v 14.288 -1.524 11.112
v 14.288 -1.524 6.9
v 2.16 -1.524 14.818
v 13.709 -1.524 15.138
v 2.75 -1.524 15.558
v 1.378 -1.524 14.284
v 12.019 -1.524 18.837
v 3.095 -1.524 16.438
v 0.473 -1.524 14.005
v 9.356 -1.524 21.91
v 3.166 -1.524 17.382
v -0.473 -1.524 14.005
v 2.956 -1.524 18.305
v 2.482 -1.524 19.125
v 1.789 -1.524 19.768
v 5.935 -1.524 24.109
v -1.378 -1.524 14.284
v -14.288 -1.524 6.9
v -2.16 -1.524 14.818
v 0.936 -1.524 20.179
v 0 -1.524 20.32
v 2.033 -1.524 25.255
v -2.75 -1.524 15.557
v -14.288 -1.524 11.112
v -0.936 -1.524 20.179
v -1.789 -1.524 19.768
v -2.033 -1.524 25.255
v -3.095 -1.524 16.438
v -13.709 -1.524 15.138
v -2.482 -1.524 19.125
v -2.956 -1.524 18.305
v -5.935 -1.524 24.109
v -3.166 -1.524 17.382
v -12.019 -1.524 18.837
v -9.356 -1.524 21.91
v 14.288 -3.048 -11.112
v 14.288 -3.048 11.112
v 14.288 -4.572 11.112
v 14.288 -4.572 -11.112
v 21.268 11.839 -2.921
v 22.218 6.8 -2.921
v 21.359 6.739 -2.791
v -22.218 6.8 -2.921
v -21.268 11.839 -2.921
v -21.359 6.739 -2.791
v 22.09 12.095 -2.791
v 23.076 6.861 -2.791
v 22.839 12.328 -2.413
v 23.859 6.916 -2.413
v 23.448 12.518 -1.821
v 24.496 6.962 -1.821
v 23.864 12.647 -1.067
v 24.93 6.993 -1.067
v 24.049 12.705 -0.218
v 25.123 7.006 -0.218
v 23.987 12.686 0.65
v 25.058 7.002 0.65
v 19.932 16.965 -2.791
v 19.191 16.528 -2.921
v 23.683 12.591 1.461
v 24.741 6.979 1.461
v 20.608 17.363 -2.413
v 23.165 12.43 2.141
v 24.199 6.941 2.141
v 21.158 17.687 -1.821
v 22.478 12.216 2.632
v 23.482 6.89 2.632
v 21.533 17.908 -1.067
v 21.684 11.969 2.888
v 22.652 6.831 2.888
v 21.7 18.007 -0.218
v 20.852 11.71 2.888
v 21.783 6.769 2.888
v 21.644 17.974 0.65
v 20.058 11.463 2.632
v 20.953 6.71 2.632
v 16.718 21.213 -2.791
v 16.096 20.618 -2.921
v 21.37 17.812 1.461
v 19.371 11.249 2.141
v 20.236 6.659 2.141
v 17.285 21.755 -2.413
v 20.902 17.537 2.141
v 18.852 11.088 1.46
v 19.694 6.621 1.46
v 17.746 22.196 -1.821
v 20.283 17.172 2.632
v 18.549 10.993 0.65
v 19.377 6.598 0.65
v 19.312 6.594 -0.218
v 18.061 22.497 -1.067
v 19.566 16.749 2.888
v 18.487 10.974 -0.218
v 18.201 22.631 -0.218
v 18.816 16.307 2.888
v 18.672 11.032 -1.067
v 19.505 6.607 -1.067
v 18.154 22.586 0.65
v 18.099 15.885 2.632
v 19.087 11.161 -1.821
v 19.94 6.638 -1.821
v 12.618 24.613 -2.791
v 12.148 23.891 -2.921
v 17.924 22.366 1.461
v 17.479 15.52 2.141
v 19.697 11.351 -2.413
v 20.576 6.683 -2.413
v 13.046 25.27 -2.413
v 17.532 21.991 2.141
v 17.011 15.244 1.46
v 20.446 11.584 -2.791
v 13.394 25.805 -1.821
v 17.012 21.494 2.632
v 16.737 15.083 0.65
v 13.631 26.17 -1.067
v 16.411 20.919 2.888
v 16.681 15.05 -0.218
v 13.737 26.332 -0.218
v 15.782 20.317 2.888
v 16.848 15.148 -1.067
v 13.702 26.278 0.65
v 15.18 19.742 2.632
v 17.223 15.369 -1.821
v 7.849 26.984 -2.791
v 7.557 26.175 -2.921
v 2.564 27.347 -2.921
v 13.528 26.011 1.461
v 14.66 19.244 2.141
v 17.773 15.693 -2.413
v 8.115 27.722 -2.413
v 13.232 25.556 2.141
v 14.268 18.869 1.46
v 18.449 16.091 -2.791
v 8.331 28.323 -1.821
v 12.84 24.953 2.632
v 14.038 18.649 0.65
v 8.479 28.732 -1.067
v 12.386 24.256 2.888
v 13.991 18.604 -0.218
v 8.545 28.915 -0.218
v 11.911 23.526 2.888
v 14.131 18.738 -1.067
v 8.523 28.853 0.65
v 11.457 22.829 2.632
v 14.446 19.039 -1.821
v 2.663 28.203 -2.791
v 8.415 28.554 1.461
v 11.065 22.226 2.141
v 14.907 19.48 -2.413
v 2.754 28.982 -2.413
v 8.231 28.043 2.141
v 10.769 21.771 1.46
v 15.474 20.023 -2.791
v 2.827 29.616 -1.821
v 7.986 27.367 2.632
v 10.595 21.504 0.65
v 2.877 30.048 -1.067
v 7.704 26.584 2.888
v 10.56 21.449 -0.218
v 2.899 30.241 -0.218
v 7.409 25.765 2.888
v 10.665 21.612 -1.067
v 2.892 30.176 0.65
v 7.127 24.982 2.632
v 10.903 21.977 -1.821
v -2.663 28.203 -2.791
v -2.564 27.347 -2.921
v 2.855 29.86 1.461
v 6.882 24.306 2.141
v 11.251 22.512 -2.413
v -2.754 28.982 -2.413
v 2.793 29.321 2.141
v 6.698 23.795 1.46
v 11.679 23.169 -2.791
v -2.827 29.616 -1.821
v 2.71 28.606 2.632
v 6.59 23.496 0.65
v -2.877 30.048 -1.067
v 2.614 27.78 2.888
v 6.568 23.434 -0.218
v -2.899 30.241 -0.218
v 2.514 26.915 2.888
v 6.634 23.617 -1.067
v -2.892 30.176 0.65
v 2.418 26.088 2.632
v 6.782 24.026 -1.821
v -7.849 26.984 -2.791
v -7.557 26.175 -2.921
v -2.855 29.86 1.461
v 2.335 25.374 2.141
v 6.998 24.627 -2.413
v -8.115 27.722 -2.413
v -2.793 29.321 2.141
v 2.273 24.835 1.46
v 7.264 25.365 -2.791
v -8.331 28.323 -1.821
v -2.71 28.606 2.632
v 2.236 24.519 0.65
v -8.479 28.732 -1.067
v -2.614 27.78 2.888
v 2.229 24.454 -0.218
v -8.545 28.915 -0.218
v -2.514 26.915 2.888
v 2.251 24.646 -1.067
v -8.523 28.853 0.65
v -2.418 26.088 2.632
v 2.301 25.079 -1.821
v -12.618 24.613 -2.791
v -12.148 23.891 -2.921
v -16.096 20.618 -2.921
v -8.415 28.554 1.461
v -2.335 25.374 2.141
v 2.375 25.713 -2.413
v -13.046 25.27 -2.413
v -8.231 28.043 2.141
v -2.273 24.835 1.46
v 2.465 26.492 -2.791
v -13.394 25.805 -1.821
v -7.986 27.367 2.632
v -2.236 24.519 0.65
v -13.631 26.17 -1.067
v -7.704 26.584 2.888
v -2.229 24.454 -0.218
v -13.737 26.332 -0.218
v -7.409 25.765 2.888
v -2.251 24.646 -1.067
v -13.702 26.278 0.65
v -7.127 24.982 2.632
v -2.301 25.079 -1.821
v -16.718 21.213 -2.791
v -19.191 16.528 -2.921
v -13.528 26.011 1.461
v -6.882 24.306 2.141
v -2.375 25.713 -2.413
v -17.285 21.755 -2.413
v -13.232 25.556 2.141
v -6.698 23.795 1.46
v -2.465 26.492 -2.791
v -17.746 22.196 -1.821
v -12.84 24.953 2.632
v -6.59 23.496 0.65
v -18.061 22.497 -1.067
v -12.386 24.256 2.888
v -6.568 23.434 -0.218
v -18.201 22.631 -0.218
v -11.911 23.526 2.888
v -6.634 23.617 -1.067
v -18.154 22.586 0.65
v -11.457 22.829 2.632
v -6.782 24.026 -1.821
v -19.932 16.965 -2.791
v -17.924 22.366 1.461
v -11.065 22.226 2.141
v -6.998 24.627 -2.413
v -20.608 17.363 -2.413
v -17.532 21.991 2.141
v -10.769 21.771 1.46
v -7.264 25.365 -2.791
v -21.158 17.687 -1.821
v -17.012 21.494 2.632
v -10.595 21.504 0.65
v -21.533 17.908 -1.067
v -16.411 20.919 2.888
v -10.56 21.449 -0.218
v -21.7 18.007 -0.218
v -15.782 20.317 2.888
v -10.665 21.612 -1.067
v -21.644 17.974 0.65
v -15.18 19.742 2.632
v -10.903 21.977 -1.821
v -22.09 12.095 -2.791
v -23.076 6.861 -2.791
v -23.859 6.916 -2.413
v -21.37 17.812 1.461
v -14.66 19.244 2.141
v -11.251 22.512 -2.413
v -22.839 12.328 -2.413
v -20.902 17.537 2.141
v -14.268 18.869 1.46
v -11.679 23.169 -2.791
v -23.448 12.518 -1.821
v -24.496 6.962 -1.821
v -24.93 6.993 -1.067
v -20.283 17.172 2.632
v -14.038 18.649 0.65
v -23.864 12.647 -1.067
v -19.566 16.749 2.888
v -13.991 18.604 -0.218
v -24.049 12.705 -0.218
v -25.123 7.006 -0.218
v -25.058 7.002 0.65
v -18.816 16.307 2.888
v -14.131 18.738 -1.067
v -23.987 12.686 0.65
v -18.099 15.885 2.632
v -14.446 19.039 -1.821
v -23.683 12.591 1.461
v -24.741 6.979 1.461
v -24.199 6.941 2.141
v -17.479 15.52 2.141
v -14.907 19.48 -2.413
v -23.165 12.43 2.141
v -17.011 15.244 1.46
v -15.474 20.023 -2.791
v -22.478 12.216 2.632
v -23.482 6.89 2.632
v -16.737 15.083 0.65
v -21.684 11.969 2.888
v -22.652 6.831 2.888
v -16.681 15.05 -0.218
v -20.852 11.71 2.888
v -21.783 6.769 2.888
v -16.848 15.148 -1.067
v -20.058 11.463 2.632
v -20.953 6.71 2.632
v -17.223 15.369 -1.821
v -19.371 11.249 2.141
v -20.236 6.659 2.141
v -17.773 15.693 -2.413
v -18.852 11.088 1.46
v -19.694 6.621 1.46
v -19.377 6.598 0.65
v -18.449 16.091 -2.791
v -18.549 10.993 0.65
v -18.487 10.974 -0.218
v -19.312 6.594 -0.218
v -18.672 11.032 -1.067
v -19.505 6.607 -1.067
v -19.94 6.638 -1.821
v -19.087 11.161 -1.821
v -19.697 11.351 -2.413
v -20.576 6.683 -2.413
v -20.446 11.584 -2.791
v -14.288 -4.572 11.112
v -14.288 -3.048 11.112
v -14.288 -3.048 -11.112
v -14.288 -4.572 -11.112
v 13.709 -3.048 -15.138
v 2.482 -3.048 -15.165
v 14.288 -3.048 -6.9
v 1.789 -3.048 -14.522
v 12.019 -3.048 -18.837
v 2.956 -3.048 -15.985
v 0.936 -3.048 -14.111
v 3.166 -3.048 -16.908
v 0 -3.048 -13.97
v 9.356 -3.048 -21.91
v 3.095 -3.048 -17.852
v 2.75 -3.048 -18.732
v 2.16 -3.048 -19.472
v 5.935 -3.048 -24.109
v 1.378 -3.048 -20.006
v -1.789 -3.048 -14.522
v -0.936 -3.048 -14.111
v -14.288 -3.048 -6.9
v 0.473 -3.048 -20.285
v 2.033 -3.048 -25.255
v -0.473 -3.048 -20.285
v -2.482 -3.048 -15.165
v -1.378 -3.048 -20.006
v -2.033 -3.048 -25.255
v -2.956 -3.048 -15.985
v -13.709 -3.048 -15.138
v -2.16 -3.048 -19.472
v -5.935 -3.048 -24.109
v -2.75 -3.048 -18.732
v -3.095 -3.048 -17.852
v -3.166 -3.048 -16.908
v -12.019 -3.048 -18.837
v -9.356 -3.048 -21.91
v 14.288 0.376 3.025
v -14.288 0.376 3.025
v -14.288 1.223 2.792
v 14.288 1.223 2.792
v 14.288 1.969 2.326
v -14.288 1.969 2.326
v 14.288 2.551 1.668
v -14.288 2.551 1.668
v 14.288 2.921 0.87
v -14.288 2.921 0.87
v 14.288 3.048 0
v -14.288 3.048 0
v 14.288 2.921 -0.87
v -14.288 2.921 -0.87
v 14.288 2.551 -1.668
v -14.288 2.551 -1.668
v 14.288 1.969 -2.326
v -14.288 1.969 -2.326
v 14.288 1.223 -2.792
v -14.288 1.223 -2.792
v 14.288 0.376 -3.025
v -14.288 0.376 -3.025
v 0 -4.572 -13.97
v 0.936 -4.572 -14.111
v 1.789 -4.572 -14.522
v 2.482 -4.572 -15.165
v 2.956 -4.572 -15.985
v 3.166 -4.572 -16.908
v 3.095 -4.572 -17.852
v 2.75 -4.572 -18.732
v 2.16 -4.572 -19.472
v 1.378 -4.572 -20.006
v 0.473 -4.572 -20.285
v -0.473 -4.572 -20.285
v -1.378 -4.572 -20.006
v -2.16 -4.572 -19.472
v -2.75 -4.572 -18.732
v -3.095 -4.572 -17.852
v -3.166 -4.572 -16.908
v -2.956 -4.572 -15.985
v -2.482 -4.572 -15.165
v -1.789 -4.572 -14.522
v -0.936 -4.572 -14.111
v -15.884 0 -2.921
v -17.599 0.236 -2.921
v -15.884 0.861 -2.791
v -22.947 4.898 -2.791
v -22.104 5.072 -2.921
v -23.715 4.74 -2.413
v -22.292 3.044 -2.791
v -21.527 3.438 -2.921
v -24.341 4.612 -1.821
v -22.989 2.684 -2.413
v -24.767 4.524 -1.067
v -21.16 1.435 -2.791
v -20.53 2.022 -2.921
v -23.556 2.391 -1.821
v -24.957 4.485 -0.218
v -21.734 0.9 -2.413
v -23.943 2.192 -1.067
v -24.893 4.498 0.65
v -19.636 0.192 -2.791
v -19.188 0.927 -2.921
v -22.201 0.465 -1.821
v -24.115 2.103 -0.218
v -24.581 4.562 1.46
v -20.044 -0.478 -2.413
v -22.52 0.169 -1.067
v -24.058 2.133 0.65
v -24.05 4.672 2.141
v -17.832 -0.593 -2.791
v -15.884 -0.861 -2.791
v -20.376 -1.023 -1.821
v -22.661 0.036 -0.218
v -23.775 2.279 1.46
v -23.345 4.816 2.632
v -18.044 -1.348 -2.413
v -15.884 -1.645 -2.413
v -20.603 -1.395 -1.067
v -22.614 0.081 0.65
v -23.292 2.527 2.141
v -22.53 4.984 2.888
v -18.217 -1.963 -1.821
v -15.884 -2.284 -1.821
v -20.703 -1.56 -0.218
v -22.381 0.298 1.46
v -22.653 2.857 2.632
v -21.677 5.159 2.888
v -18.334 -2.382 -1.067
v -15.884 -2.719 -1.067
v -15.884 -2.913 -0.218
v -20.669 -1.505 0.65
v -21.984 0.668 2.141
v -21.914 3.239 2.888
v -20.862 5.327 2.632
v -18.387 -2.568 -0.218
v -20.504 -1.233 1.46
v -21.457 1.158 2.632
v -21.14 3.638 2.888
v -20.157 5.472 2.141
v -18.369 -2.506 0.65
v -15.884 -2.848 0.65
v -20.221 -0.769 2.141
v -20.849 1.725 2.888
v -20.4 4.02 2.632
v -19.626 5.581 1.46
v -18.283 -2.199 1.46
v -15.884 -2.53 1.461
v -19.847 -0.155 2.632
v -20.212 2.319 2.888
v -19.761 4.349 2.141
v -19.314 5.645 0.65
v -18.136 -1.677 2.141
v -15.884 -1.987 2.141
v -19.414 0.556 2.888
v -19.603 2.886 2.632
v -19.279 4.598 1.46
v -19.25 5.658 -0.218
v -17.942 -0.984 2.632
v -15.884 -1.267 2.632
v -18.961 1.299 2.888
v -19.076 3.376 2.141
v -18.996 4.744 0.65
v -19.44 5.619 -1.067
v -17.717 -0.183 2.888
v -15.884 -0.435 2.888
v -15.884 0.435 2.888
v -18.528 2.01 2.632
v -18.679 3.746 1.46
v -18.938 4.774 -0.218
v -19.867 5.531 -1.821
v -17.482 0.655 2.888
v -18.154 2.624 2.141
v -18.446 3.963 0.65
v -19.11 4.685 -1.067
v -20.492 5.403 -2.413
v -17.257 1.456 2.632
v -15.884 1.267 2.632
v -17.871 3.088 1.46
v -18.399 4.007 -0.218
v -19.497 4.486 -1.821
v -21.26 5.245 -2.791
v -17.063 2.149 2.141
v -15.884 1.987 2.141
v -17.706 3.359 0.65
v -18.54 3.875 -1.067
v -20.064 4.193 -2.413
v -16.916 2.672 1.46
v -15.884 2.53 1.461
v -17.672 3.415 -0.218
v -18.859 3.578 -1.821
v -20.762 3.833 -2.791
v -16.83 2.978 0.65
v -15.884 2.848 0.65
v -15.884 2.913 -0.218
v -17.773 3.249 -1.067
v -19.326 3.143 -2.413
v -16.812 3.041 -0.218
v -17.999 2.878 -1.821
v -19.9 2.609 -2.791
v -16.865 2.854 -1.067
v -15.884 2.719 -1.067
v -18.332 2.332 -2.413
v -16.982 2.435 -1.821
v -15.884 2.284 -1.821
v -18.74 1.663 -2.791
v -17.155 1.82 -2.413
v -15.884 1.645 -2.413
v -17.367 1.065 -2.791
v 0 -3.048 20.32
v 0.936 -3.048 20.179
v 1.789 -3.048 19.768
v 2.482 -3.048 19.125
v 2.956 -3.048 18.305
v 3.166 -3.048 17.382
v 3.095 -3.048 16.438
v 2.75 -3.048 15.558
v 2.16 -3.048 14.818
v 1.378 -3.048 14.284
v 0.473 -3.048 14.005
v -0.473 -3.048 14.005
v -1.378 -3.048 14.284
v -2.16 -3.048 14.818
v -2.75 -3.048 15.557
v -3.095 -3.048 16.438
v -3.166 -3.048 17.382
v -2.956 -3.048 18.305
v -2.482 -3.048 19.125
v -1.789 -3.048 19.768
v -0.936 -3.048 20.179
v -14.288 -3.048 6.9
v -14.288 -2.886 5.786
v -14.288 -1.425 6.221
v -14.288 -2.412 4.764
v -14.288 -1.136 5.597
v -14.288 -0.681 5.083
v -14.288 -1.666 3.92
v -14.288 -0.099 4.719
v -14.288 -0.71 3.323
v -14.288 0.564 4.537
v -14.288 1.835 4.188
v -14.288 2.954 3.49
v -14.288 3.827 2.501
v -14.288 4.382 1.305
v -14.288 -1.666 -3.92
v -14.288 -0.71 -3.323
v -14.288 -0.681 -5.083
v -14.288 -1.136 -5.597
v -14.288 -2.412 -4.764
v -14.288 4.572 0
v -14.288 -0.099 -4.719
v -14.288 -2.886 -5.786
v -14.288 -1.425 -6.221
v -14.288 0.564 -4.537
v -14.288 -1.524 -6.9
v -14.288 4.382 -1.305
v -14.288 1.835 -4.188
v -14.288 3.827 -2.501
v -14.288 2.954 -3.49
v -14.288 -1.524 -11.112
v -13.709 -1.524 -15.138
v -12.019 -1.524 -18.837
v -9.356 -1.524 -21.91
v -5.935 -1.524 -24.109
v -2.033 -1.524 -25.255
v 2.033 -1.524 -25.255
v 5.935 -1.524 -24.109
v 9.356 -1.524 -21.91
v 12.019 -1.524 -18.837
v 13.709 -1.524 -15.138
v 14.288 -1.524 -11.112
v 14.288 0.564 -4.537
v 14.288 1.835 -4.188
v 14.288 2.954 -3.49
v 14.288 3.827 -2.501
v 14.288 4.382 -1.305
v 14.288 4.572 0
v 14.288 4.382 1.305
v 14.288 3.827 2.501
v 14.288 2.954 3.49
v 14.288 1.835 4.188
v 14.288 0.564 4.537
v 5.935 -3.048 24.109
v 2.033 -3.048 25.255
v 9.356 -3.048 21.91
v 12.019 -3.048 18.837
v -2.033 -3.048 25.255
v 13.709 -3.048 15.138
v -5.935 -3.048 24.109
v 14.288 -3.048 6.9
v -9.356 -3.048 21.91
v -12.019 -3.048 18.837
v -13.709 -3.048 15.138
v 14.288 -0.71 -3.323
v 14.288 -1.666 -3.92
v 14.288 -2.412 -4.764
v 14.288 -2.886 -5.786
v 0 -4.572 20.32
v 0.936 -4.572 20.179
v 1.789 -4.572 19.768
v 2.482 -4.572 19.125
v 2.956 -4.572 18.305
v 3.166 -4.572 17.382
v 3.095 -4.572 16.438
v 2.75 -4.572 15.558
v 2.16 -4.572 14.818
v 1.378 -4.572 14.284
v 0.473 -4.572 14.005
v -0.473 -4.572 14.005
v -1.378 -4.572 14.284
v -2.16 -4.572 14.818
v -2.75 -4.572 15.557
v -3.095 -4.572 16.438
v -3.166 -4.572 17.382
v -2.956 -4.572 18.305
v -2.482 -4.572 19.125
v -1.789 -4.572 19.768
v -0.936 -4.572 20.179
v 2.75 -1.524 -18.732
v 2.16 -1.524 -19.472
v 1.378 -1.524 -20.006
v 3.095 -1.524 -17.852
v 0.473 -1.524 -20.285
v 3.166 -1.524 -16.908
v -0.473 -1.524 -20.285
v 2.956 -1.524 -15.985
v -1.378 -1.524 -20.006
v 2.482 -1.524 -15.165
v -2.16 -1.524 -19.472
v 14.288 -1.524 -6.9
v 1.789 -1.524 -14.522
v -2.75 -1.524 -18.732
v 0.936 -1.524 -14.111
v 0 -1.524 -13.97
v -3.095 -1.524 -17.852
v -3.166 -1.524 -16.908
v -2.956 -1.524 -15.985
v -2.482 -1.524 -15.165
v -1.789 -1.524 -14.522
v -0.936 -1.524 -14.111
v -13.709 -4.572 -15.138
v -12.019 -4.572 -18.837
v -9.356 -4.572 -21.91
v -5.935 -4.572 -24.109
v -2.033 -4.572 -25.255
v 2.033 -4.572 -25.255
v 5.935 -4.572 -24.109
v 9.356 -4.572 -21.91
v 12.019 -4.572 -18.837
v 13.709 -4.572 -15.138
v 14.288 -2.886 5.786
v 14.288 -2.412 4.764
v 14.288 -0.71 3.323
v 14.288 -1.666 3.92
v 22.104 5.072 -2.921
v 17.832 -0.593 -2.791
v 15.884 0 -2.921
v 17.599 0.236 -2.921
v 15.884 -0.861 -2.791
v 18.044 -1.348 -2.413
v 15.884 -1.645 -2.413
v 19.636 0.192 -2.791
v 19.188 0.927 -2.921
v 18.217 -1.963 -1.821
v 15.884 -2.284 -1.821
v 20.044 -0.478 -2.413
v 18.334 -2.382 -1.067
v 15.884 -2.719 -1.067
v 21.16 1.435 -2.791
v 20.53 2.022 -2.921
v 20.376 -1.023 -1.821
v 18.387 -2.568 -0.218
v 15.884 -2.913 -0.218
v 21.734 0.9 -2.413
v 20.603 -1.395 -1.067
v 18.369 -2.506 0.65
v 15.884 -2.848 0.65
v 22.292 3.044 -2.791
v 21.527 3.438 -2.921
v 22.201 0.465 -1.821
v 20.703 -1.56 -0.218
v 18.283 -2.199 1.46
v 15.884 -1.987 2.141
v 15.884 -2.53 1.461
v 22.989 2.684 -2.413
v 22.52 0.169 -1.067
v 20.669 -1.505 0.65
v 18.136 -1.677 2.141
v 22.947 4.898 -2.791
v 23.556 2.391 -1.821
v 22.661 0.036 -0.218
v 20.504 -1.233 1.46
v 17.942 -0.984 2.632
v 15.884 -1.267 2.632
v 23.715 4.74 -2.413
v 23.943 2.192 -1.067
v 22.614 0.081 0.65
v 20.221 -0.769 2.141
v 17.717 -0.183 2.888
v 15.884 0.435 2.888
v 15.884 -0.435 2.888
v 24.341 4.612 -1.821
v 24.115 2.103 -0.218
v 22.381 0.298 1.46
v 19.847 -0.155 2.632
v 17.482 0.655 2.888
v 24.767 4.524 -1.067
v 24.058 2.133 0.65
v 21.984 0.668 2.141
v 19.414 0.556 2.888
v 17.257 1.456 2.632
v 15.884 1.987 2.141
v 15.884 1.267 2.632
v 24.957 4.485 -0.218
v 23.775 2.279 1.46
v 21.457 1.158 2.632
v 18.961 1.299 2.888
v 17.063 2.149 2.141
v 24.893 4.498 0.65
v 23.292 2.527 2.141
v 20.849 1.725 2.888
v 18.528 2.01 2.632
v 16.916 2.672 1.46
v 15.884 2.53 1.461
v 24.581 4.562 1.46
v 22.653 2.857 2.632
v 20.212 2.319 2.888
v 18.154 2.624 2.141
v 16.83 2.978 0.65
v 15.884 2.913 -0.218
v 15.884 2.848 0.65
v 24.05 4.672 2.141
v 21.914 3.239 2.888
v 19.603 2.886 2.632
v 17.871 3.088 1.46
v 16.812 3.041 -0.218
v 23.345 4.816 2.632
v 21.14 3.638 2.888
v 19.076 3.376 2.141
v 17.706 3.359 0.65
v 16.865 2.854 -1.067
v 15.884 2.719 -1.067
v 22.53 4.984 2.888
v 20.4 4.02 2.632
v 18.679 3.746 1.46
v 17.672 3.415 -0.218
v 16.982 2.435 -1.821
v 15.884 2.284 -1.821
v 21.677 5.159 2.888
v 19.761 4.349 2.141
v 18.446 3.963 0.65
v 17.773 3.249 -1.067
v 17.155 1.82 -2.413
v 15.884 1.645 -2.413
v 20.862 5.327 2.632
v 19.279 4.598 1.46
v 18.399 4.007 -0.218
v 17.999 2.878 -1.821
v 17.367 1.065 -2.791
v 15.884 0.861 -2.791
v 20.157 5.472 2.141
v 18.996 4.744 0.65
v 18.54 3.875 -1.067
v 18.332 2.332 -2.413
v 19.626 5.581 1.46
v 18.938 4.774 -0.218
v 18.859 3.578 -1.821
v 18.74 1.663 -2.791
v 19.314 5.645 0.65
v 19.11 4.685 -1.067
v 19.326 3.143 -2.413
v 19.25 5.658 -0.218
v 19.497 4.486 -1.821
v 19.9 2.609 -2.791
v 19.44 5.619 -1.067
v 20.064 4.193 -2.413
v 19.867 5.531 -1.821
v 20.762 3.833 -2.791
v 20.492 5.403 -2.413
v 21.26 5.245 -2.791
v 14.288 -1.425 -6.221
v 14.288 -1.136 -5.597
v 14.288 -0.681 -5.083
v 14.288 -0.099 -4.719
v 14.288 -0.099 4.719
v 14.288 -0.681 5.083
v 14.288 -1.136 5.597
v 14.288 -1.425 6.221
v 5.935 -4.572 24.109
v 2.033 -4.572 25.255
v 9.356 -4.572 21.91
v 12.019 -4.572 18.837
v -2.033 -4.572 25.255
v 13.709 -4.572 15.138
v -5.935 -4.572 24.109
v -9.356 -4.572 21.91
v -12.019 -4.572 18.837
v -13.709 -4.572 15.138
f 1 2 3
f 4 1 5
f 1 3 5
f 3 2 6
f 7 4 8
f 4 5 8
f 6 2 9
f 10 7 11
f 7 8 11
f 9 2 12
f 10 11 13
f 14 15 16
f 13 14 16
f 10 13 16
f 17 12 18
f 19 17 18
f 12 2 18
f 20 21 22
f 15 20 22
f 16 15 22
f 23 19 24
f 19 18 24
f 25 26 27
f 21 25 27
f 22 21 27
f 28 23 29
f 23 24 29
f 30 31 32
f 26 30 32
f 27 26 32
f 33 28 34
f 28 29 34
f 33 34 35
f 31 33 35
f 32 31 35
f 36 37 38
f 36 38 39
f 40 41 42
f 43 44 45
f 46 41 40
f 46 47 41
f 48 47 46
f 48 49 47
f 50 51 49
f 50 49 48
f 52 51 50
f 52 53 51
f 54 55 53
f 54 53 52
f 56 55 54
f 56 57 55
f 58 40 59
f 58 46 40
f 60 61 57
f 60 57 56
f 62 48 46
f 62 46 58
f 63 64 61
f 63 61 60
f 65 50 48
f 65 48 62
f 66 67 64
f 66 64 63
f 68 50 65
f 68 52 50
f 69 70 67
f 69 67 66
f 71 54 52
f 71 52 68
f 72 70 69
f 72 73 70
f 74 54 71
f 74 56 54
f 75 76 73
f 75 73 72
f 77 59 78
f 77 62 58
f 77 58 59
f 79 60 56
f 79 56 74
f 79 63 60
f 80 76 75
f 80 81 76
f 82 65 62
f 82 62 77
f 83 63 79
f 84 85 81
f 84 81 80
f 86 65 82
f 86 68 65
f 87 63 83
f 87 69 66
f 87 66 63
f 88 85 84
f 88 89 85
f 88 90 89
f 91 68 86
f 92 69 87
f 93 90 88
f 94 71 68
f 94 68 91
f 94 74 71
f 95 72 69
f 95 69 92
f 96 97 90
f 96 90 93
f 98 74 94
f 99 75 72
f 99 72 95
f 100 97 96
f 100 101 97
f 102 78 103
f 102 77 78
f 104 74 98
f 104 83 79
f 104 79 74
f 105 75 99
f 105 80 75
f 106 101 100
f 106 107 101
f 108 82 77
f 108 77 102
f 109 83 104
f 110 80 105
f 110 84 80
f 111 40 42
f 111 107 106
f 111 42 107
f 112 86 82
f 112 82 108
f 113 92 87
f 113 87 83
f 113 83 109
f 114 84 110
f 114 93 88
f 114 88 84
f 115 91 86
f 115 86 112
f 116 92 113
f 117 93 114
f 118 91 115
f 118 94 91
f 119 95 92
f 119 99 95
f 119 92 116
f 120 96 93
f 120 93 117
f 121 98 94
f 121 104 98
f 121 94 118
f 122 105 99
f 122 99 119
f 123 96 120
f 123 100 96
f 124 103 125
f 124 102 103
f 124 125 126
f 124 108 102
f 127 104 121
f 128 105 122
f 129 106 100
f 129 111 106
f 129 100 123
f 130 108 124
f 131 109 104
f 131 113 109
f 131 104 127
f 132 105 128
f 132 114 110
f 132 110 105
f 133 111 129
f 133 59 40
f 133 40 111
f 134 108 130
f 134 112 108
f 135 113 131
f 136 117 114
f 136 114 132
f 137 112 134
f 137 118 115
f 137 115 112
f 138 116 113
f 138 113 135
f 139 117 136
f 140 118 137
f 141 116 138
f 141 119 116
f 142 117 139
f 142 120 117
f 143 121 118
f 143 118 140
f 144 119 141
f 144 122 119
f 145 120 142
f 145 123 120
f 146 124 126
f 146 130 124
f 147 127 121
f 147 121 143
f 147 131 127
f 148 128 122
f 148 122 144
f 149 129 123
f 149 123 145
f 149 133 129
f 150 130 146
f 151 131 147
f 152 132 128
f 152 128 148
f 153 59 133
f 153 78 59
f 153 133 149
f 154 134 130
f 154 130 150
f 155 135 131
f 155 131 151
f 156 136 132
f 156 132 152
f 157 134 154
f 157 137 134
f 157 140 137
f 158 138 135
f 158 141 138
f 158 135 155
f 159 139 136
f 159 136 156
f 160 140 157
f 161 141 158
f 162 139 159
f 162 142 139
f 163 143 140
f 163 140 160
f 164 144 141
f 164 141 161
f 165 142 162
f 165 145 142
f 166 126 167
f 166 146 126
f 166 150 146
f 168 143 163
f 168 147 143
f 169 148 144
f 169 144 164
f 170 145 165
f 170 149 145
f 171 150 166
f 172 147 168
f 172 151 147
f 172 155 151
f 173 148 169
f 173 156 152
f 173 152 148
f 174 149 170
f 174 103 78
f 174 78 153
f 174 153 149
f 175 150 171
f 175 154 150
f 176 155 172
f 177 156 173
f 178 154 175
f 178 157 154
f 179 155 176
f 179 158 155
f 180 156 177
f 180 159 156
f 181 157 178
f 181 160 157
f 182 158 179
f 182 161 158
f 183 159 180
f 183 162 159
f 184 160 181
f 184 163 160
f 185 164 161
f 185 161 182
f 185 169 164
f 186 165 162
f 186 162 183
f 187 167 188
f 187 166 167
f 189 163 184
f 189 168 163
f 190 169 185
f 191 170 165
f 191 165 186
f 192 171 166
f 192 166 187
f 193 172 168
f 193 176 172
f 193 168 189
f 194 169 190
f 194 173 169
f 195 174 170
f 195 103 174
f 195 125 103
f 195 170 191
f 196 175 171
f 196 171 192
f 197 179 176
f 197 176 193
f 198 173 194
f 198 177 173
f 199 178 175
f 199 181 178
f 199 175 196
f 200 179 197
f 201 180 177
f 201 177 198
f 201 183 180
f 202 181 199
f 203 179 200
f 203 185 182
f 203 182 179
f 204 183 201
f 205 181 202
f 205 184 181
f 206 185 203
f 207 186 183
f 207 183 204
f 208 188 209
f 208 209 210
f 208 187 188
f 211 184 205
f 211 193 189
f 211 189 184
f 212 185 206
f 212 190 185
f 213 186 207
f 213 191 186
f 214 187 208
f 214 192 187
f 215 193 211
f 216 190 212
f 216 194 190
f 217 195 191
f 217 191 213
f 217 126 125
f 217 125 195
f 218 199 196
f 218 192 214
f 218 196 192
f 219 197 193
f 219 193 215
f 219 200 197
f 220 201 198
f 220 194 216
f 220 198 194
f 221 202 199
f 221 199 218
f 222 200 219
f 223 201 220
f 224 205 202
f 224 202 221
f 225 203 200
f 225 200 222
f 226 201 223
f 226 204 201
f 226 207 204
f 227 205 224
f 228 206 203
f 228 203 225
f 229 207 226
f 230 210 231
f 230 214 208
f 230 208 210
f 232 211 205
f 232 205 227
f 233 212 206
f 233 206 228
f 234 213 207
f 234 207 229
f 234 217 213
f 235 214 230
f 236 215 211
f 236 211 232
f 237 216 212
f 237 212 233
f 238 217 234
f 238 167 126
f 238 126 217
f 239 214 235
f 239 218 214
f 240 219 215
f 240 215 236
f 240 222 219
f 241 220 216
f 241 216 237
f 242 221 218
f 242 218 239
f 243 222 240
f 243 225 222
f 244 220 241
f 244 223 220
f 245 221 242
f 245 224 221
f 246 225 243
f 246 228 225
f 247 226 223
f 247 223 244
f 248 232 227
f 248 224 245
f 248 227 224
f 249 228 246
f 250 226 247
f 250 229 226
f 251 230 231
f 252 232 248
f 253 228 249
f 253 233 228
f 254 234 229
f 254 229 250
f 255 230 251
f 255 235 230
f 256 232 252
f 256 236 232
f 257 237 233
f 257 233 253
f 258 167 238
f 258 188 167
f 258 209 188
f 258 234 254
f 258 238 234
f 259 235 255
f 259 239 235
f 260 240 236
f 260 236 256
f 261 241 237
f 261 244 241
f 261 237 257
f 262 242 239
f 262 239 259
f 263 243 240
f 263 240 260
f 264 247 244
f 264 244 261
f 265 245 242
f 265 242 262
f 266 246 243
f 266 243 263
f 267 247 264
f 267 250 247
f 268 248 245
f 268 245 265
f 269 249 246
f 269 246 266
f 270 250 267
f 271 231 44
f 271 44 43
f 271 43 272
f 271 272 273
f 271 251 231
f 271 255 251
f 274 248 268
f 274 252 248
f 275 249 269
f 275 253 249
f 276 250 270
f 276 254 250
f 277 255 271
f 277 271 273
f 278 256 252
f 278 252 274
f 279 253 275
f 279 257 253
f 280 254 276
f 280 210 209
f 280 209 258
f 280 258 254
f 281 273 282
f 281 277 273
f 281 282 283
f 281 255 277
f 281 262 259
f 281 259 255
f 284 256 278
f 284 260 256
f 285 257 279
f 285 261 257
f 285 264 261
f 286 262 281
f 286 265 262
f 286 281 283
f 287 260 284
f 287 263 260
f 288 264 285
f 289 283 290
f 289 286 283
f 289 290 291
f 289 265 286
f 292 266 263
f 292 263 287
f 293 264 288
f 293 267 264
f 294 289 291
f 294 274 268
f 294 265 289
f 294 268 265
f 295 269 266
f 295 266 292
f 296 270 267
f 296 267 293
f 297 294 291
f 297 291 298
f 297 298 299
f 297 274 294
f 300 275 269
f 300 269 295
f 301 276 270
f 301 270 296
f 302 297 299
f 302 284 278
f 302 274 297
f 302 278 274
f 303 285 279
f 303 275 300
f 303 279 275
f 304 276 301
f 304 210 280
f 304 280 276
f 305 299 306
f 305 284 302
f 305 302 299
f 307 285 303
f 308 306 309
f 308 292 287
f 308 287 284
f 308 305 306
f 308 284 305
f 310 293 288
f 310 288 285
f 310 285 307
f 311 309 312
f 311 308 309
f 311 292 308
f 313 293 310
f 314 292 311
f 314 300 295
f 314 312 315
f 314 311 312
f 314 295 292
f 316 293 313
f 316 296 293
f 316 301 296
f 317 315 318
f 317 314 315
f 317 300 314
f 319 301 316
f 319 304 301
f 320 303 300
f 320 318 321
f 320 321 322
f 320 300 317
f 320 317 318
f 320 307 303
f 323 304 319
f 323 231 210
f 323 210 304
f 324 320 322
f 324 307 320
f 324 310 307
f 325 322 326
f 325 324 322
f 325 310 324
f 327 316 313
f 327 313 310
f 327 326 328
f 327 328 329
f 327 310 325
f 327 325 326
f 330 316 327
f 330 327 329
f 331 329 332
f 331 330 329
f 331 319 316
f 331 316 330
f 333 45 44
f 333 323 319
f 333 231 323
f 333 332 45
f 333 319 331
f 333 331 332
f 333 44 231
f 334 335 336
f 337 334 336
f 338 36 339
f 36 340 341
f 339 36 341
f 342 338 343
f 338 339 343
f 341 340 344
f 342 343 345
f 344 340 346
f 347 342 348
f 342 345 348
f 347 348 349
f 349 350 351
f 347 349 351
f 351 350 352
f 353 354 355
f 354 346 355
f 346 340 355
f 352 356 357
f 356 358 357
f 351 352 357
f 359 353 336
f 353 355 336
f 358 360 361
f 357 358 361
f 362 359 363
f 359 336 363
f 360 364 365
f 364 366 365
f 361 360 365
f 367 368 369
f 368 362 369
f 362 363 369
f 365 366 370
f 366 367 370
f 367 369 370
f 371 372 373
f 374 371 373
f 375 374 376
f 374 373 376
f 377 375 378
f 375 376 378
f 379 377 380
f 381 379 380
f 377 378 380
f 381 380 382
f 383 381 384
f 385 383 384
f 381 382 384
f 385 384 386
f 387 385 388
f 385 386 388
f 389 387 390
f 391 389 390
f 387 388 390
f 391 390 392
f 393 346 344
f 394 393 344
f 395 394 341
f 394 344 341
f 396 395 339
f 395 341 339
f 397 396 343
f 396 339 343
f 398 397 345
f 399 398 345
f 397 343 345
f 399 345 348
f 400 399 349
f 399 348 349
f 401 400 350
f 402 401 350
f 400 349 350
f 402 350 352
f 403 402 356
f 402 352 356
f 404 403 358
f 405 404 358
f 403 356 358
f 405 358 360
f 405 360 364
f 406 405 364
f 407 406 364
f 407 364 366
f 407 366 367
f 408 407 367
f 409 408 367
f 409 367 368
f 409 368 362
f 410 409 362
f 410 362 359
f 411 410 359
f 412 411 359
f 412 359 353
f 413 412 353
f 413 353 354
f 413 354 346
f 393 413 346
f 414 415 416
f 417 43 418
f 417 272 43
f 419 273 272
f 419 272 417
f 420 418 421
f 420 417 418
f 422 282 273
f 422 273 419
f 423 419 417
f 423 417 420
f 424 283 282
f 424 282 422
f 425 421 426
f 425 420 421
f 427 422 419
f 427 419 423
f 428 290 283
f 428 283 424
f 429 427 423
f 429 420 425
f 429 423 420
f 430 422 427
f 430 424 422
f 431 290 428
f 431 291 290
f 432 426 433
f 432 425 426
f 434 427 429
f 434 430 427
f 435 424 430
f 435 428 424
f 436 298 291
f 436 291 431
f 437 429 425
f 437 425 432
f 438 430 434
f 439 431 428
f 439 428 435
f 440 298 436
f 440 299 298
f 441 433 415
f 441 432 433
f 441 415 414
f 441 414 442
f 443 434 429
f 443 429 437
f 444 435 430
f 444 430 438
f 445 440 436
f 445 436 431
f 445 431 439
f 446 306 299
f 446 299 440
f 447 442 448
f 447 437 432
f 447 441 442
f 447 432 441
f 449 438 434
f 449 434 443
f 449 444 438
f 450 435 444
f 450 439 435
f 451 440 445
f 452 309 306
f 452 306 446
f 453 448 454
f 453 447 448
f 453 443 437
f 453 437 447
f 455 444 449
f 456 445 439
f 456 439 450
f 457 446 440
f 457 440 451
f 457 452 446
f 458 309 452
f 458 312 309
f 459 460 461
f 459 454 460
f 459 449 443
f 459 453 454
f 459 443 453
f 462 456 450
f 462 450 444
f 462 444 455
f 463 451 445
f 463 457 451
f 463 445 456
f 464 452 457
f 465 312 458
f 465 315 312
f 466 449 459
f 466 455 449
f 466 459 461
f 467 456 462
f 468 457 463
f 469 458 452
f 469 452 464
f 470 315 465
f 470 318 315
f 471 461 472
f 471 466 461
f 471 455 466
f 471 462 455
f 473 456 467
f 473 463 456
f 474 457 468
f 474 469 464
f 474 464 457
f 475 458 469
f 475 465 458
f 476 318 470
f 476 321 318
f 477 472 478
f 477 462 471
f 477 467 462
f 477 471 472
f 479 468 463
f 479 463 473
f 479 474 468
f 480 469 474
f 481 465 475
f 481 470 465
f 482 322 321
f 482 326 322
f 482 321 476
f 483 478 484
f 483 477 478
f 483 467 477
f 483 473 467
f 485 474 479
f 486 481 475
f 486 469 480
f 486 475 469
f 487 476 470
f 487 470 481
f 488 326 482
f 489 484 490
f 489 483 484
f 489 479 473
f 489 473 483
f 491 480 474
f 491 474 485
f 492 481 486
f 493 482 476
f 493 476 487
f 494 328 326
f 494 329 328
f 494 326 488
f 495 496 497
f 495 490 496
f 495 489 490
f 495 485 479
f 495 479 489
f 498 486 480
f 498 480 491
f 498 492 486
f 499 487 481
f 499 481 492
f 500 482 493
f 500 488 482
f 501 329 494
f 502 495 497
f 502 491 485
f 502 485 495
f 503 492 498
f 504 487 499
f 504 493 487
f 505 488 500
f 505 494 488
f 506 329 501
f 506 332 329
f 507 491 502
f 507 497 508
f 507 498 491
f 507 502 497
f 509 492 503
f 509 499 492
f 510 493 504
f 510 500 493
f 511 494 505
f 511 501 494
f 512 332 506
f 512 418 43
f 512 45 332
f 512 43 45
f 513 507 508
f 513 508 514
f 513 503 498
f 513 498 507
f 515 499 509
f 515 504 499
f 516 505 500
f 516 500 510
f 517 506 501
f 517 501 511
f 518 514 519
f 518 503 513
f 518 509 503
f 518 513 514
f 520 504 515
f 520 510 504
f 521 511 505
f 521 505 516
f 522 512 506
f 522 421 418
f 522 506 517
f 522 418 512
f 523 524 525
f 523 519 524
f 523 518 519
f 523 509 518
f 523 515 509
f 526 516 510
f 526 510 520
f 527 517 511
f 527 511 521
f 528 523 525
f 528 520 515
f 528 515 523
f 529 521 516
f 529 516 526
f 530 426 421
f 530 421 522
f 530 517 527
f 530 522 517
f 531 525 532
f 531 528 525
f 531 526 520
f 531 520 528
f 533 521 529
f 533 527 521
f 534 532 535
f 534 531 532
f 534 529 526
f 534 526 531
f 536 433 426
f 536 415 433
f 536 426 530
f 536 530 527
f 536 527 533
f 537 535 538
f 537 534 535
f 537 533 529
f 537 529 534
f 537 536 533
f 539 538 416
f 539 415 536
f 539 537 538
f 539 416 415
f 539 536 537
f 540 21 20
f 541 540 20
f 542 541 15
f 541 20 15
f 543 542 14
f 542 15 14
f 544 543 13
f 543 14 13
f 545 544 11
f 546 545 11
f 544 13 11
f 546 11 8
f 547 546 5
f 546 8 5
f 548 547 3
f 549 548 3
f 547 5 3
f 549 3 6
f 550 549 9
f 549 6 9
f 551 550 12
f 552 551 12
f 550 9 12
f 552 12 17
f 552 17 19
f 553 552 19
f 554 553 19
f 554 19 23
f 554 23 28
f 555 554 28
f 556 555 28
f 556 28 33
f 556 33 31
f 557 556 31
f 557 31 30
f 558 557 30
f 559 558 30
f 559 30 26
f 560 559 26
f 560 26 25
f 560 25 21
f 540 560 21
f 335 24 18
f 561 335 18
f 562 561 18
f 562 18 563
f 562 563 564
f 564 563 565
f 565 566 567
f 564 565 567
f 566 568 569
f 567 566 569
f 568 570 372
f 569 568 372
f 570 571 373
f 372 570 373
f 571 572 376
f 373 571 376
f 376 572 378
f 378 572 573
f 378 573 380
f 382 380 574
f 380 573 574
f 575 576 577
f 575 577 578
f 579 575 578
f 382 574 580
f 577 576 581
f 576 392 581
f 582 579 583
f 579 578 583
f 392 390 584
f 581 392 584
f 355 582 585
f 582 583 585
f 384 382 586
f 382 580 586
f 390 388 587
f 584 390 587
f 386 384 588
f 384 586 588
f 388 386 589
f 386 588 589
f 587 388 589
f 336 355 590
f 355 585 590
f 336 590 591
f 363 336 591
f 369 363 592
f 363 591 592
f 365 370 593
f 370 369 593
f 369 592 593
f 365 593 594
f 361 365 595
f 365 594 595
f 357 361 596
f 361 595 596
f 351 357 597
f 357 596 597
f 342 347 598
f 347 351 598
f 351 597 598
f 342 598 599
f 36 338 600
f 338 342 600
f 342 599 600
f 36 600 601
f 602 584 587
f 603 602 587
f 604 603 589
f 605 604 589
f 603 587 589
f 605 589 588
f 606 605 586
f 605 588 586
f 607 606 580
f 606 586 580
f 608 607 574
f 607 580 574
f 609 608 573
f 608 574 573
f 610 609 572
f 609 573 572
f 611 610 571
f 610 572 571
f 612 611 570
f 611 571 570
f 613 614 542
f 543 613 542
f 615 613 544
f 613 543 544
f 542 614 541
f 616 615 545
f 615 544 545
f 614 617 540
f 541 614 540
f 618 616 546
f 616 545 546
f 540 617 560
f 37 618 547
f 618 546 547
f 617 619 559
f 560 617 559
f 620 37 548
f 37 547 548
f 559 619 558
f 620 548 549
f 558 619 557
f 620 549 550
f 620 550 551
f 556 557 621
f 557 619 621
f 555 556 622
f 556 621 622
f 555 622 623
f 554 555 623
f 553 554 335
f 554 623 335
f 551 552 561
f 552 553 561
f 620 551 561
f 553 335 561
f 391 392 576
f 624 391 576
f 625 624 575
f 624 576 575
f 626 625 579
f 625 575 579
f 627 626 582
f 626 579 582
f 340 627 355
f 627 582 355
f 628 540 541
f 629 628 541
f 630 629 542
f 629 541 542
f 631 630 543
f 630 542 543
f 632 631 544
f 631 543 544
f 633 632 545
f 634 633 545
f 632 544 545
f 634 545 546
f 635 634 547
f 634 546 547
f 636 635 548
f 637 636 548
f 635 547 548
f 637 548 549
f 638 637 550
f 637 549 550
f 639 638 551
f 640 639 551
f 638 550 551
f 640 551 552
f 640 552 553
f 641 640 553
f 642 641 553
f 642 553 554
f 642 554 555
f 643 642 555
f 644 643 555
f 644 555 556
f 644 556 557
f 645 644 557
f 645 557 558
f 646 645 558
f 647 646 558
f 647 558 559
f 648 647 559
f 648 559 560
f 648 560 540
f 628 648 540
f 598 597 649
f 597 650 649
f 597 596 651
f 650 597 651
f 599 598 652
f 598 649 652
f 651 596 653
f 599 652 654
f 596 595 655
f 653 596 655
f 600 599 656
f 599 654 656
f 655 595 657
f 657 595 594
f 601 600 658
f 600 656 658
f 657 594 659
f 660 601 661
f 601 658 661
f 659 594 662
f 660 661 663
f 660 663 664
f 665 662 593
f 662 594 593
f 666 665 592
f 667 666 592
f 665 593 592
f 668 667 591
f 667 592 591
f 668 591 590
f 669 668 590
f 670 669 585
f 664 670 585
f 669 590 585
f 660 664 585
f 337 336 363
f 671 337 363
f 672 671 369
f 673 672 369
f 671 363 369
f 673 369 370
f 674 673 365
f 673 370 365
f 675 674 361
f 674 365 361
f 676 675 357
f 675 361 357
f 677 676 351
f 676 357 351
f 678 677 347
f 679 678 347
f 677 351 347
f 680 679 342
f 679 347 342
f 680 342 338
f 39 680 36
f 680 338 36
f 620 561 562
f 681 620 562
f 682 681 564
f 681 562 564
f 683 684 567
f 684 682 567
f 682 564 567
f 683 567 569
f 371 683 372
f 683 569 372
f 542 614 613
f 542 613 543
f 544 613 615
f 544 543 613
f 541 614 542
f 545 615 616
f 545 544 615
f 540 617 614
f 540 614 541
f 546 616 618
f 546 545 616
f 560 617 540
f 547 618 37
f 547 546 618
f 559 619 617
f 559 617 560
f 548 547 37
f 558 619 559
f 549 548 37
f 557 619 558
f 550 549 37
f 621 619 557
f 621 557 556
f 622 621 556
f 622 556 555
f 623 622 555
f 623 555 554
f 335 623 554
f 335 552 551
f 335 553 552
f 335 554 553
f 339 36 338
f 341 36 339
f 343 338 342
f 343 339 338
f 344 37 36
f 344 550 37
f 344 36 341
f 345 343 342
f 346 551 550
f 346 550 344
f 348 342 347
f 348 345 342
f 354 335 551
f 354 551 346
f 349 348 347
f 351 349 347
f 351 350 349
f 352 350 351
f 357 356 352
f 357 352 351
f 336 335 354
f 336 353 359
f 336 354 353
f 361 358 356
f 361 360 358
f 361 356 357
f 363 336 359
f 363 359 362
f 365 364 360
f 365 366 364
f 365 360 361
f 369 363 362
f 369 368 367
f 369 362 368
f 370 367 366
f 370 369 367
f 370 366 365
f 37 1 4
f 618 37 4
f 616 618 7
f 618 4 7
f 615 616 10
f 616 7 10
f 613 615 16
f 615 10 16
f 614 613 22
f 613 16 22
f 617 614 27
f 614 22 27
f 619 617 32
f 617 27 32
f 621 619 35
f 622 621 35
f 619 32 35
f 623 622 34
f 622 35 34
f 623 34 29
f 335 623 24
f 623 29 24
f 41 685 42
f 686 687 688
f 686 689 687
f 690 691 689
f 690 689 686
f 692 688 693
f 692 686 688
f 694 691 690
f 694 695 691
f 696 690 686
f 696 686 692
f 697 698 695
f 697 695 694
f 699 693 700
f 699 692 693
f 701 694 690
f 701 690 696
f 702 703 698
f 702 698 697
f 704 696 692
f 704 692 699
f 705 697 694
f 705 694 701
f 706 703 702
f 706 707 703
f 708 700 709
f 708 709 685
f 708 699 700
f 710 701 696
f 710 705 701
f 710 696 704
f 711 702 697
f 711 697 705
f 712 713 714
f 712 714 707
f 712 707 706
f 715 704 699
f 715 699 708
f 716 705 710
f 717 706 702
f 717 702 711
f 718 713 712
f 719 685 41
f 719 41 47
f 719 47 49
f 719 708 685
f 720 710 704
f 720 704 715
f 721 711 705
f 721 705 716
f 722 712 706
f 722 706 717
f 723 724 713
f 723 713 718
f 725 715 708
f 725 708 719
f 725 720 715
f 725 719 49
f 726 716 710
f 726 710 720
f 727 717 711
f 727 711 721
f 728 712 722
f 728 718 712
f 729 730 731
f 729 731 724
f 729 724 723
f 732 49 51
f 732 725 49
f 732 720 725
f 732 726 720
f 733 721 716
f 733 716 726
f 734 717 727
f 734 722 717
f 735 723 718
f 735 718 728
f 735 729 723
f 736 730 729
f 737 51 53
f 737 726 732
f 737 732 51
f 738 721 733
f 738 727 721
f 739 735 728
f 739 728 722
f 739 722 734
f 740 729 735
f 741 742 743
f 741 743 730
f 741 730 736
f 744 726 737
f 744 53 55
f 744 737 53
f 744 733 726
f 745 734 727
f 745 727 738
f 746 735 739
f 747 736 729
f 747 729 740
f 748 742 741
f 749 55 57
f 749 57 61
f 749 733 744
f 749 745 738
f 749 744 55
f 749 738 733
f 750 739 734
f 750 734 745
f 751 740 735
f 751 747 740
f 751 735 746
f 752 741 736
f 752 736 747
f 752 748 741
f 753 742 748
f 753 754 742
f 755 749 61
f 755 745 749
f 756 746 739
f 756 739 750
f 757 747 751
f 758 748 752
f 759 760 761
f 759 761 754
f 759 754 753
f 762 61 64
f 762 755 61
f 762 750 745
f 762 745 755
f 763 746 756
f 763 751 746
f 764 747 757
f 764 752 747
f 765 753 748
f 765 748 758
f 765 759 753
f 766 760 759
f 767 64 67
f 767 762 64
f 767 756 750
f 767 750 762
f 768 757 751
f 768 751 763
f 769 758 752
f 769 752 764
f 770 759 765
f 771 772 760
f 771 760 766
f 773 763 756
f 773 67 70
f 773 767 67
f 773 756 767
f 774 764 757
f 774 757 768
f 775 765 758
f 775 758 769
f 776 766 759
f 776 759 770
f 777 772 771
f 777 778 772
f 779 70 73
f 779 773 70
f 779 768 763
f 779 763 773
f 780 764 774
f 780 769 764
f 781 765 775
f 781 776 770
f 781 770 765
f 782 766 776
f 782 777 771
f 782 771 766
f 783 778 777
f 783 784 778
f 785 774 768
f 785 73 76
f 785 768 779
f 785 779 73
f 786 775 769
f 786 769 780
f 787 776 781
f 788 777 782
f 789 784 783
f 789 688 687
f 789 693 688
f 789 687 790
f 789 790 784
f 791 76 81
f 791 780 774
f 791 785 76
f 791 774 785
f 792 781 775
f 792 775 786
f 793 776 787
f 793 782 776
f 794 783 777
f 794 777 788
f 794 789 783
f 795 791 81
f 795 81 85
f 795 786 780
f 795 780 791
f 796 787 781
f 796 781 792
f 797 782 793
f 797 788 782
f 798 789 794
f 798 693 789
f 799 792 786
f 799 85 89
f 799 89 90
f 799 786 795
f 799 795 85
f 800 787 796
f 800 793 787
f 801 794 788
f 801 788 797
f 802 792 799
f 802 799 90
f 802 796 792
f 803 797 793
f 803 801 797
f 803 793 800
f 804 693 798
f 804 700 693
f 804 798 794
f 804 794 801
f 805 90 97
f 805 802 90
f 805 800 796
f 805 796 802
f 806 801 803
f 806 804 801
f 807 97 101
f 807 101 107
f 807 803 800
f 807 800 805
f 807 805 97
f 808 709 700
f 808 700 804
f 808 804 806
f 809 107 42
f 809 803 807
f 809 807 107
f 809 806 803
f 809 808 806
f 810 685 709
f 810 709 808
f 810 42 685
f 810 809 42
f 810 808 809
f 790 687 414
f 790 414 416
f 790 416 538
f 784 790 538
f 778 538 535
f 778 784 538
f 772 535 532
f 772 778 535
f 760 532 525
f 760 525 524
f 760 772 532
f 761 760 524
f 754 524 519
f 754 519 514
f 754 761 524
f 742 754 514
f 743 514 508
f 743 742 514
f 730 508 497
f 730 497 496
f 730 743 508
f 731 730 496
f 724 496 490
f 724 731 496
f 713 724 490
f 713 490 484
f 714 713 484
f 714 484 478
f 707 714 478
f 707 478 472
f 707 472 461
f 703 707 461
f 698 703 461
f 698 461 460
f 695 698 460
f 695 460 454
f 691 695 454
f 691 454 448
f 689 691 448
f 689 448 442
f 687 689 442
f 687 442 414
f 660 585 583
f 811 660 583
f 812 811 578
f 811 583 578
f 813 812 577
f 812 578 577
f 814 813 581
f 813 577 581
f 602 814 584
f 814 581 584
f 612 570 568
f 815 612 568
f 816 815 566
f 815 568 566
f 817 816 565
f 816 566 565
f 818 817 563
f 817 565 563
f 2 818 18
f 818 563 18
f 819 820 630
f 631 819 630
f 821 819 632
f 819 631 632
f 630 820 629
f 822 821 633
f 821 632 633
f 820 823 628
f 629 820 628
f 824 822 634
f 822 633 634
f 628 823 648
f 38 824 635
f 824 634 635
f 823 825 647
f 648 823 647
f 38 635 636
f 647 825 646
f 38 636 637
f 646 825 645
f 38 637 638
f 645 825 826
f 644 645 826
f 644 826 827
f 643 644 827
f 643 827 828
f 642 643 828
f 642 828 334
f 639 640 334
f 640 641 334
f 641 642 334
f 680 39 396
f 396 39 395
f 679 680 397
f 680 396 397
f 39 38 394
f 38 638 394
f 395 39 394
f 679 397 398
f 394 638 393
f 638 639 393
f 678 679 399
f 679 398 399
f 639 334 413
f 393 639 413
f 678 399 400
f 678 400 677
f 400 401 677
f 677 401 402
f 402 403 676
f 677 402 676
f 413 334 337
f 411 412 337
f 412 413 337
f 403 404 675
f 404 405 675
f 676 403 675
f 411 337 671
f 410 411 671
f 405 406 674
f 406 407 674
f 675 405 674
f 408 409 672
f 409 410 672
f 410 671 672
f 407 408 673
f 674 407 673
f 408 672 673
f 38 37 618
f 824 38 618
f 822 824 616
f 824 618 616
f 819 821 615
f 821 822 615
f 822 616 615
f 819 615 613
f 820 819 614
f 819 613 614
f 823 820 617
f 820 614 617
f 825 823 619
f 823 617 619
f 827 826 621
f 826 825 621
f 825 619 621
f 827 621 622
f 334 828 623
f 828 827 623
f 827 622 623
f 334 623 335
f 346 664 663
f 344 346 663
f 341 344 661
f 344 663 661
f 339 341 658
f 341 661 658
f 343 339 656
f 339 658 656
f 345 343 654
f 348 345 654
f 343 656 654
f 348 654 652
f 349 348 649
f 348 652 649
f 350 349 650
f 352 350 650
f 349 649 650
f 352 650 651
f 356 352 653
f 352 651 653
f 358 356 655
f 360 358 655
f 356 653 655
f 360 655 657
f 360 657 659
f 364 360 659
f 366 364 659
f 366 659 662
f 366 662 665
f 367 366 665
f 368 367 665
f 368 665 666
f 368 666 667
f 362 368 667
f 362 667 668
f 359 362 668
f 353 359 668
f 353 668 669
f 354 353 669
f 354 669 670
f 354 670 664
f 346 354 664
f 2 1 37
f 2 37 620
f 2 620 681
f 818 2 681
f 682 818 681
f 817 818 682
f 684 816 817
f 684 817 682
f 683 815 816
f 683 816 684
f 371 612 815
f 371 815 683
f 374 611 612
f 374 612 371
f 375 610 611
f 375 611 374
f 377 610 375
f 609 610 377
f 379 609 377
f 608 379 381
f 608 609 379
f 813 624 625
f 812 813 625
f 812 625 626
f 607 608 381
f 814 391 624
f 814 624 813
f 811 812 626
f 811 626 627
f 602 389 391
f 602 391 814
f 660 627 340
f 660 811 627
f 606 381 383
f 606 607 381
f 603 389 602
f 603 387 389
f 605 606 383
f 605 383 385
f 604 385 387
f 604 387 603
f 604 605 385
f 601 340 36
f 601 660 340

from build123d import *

# Parameters (mm, degrees)
BOSS_EXTRUDE1_DEPTH      = 14.2875
BOSS_EXTRUDE1_DEPTH_BACK = 14.2875
BOSS_EXTRUDE2_DEPTH      = 14.2875
BOSS_EXTRUDE2_DEPTH_BACK = 14.2875
SKETCH5_W                = 50.8
SKETCH5_H                = 1.524
SKETCH6_OUTSIDE_W        = 42.376
SKETCH6_OUTSIDE_H        = 64.6
CUT_EXTRUDE1_DEPTH       = 30.499082024
SKETCH7_R                = 3.175
CUT_EXTRUDE2_DEPTH       = 30.499082024
SKETCH8_R                = 2.921


with BuildPart() as part:
    # Sketch4 → Boss-Extrude1 (new, two sides: drawn at the far end of the back side and taken through both)
    with BuildSketch(Plane(origin=(0, 0, 0), x_dir=(0, 0, -1), z_dir=(1, 0, 0)).offset(-BOSS_EXTRUDE1_DEPTH_BACK)):
        with BuildLine():
            Line((-25.4, -3.048), (-6.900203475, -3.048))
            ThreePointArc((-6.900203475, -3.048), (-4.314597158, -2.069457627), (-3.024746729, 0.375780822))
            ThreePointArc((-3.024746729, 0.375780822), (0, 3.048), (3.024746729, 0.375780822))
            ThreePointArc((3.024746729, 0.375780822), (4.314597158, -2.069457627), (6.900203475, -3.048))
            Line((6.900203475, -3.048), (25.4, -3.048))
            Line((25.4, -3.048), (25.4, -1.524))
            Line((25.4, -1.524), (6.900203475, -1.524))
            ThreePointArc((6.900203475, -1.524), (5.323614257, -0.927327821), (4.537120093, 0.563671233))
            ThreePointArc((4.537120093, 0.563671233), (0, 4.572), (-4.537120093, 0.563671233))
            ThreePointArc((-4.537120093, 0.563671233), (-5.323614257, -0.927327821), (-6.900203475, -1.524))
            Line((-6.900203475, -1.524), (-25.4, -1.524))
            Line((-25.4, -1.524), (-25.4, -3.048))
        make_face()
    extrude(amount=BOSS_EXTRUDE1_DEPTH + BOSS_EXTRUDE1_DEPTH_BACK)


with BuildPart() as body_2:
    # Sketch5 → Boss-Extrude2 (new, two sides: drawn at the far end of the back side and taken through both)
    with BuildSketch(Plane(origin=(0, 0, 0), x_dir=(0, 0, -1), z_dir=(1, 0, 0)).offset(-BOSS_EXTRUDE2_DEPTH_BACK)):
        with Locations((0, -3.81)):
            Rectangle(SKETCH5_W, SKETCH5_H)
    extrude(amount=BOSS_EXTRUDE2_DEPTH + BOSS_EXTRUDE2_DEPTH_BACK)


with BuildPart() as cut_extrude1_tool:
    # Sketch6 outside → Cut-Extrude1 (new, through all)
    with BuildSketch(Plane(origin=(0, 0, 0), x_dir=(1, 0, 0), z_dir=(0, 1, 0))):
        Rectangle(SKETCH6_OUTSIDE_W, SKETCH6_OUTSIDE_H)
        with BuildLine():
            Line((-14.2875, -11.1125), (-14.2875, 11.1125))
            ThreePointArc((-14.2875, 11.1125), (0, 25.4), (14.2875, 11.1125))
            Line((14.2875, 11.1125), (14.2875, -11.1125))
            ThreePointArc((14.2875, -11.1125), (0, -25.4), (-14.2875, -11.1125))
        make_face(mode=Mode.SUBTRACT)
    extrude(amount=-CUT_EXTRUDE1_DEPTH)


with BuildPart() as part_1:
    add(part.part)

    # Cut-Extrude1: cut by cut_extrude1_tool
    add(cut_extrude1_tool.part, mode=Mode.SUBTRACT)


with BuildPart() as body_2_1:
    add(body_2.part)

    # Cut-Extrude1: cut by cut_extrude1_tool
    add(cut_extrude1_tool.part, mode=Mode.SUBTRACT)


with BuildPart() as cut_extrude2_tool:
    # Sketch7 → Cut-Extrude2 (new, through all)
    with BuildSketch(Plane(origin=(0, 0, 0), x_dir=(1, 0, 0), z_dir=(0, 1, 0))):
        with Locations(Location((0, -17.145, 0), (0, 0, 270))):
            Circle(SKETCH7_R)
        with Locations(Location((0, 17.145, 0), (0, 0, 270))):
            Circle(SKETCH7_R)
    extrude(amount=-CUT_EXTRUDE2_DEPTH)


with BuildPart() as part_2:
    add(part_1.part)

    # Cut-Extrude2: cut by cut_extrude2_tool
    add(cut_extrude2_tool.part, mode=Mode.SUBTRACT)


with BuildPart() as body_2_2:
    add(body_2_1.part)

    # Cut-Extrude2: cut by cut_extrude2_tool
    add(cut_extrude2_tool.part, mode=Mode.SUBTRACT)


with BuildPart() as body_3:
    # Sweep1: sweep along a path in Sketch9
    with BuildLine(Plane.XY) as sweep1_path:
        Line((-15.883616212, 0), (15.883616212, 0))
        ThreePointArc((15.883616212, 0), (20.530076972, 2.021847692), (22.217660264, 6.799873258))
        ThreePointArc((22.217660264, 6.799873258), (0, 27.4955), (-22.217660264, 6.799873258))
        ThreePointArc((-22.217660264, 6.799873258), (-20.530076972, 2.021847692), (-15.883616212, 0))
    # Sketch8 → Sweep1 (sweep)
    with BuildSketch(Plane(origin=(0, 0, 0), x_dir=(0, 0, -1), z_dir=(1, 0, 0))):
        Circle(SKETCH8_R)
    sweep(path=sweep1_path.line)


solid = Compound([part_2.part, body_2_2.part, body_3.part])
